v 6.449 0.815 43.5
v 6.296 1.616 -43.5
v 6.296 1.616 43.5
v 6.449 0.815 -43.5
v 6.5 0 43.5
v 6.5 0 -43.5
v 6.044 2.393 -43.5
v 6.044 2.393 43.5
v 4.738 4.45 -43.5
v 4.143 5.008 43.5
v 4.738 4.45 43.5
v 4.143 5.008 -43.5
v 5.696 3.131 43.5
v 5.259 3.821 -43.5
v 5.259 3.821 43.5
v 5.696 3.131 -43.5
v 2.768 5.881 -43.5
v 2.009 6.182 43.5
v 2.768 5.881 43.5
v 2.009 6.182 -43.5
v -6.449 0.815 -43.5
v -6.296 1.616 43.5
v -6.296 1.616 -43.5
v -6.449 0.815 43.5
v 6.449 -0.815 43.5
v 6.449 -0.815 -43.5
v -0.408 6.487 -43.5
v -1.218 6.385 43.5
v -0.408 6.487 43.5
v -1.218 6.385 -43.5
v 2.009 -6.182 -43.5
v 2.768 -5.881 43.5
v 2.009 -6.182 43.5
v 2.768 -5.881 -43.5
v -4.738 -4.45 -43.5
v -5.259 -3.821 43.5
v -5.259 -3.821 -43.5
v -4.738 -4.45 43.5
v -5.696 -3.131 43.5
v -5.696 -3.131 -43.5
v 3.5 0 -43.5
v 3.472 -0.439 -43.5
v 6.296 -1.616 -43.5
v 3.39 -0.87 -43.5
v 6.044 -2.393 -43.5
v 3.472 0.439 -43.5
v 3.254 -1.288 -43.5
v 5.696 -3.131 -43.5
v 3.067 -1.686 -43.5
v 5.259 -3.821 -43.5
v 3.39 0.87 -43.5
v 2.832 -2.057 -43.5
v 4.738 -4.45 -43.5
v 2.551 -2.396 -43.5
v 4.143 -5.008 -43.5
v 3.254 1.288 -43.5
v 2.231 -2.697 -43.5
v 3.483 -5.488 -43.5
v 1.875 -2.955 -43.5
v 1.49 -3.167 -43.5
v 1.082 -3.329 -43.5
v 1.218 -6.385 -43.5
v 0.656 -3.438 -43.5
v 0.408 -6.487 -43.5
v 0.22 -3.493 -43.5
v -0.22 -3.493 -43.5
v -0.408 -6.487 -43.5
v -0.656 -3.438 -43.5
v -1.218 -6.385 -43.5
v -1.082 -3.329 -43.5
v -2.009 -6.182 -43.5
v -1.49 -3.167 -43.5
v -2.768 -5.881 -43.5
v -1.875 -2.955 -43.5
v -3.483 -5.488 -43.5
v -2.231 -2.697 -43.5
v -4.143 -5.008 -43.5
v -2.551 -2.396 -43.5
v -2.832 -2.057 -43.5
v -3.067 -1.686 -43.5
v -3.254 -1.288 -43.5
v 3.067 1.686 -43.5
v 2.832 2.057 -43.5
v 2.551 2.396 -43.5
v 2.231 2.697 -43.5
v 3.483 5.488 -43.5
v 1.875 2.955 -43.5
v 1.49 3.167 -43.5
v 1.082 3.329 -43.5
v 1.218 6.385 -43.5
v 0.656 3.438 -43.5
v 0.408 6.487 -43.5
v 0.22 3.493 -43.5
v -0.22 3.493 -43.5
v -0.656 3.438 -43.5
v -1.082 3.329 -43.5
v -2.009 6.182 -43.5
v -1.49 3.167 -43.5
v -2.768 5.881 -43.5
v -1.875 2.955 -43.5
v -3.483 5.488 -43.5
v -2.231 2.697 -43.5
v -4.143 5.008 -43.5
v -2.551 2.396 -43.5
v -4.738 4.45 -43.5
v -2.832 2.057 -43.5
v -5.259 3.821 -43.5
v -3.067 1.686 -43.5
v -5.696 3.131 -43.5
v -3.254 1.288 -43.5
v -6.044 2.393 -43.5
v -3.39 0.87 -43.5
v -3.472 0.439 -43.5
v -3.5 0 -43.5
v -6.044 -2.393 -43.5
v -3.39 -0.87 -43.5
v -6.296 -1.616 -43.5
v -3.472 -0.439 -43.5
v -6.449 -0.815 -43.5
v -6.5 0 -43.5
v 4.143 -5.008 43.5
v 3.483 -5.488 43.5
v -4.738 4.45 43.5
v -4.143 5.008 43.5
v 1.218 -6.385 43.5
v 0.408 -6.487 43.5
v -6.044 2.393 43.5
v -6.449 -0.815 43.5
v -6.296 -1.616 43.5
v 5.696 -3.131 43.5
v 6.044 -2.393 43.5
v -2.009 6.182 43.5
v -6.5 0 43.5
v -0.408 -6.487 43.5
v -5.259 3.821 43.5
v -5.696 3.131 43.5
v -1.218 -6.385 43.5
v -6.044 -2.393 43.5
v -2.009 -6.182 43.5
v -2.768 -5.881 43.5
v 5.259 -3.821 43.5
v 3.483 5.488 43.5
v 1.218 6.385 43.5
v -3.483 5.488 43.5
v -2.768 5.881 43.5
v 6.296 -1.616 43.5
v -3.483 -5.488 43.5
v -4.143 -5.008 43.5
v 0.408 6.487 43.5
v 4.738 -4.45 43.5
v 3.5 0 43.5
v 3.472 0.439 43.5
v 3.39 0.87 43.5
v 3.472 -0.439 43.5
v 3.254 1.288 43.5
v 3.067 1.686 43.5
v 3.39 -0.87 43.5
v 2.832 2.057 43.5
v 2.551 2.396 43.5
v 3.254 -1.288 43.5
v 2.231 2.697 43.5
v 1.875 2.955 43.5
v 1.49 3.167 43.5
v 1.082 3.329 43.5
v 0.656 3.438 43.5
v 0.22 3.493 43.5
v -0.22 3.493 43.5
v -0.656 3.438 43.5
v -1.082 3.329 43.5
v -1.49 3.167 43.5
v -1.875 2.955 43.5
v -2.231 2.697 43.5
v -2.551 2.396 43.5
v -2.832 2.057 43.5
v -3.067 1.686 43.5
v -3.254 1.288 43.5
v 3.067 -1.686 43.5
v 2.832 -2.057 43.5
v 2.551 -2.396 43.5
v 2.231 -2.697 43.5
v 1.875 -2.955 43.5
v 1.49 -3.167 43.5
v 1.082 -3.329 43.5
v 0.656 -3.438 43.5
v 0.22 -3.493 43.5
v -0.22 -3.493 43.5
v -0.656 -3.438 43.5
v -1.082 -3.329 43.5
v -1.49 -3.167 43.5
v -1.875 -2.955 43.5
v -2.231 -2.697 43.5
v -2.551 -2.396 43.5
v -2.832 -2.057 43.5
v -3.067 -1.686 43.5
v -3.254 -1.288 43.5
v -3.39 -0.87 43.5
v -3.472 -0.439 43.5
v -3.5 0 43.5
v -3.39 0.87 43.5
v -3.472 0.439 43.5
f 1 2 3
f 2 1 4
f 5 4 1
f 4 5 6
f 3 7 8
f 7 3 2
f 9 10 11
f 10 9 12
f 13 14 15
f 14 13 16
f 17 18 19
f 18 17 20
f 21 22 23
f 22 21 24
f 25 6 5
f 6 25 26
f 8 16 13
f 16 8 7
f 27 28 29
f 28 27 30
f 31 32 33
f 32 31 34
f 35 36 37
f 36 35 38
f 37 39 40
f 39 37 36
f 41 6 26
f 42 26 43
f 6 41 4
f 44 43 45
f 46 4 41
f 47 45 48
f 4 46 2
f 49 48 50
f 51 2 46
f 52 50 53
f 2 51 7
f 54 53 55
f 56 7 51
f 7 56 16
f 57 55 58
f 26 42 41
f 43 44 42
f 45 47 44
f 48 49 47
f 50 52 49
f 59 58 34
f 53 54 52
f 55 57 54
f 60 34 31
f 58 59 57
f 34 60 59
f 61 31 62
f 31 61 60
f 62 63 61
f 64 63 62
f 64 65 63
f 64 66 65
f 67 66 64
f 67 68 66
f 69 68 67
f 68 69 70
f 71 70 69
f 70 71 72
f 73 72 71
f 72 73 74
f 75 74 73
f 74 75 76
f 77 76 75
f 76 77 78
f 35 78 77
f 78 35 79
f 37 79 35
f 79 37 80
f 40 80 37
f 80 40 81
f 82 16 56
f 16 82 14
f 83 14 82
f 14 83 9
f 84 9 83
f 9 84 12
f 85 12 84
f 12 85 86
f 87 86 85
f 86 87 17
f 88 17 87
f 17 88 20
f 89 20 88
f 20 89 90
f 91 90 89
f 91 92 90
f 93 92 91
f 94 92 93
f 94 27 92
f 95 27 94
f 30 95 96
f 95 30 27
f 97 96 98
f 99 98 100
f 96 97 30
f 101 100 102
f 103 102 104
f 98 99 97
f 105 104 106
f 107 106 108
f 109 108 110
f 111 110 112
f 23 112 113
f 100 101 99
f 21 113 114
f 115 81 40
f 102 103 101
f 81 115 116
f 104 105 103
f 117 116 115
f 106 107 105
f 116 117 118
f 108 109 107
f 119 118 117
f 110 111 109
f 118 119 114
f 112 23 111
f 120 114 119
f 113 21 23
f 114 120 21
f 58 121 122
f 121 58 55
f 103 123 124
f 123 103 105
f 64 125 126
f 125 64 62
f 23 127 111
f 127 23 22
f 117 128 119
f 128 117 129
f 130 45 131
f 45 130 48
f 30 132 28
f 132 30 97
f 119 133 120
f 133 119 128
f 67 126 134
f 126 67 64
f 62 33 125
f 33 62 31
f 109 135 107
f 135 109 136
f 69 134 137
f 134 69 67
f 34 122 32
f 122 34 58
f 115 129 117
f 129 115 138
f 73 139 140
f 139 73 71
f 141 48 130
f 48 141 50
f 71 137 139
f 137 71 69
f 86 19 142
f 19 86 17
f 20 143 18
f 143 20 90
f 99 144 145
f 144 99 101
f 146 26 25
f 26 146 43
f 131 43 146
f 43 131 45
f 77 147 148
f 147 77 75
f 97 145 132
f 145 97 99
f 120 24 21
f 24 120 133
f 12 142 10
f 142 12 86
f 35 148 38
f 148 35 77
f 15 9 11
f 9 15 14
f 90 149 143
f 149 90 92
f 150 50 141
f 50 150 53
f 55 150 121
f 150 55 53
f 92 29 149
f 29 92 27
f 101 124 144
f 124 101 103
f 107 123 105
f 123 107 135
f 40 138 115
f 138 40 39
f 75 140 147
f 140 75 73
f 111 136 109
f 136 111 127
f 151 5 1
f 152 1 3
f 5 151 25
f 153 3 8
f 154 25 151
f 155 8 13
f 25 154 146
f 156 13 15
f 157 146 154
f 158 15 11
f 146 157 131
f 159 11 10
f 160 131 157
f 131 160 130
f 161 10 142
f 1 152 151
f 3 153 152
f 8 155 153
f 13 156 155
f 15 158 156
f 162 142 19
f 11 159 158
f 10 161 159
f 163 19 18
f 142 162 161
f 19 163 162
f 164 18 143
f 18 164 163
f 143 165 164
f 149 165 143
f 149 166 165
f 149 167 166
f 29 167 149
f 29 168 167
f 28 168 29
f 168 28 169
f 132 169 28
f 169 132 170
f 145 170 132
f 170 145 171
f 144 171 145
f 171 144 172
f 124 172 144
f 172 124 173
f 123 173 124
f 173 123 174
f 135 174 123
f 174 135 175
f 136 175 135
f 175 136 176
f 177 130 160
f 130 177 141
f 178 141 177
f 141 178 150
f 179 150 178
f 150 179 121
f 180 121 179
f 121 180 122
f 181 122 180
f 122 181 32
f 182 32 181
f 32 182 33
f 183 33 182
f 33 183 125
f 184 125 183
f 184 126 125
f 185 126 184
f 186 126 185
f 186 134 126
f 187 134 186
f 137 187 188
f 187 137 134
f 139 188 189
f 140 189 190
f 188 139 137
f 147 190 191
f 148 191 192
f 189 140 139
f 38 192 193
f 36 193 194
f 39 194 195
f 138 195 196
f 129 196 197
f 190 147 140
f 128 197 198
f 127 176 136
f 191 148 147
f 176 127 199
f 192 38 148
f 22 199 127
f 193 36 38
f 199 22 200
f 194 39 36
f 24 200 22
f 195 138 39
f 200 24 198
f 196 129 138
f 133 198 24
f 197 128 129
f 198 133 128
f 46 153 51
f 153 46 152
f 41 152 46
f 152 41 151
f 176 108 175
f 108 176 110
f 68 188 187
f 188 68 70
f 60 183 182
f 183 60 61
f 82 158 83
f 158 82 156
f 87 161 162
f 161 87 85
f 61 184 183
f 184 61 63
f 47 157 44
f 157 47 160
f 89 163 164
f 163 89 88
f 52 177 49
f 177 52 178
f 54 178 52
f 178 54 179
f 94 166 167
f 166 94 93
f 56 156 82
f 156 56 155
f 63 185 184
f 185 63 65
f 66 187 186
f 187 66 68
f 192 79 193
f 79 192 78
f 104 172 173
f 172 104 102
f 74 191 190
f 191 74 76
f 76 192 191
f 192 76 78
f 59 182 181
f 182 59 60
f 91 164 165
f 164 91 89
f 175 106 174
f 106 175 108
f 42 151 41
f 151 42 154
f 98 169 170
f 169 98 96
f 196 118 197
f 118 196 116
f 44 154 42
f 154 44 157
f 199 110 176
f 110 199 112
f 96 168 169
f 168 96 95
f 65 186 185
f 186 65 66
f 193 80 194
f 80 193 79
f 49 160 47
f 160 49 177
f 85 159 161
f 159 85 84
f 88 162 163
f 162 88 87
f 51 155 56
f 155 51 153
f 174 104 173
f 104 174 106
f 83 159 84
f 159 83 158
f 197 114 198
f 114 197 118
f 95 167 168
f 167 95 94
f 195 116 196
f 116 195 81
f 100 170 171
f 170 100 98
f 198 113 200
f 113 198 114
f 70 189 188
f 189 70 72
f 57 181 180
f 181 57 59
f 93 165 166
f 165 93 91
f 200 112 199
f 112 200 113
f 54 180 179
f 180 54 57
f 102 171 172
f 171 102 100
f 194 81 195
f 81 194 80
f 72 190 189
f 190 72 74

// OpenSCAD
$fn = 50;


difference() {
	union() {
		translate(v = [0, 0, -43.5000000000]) {
			cylinder(h = 87, r = 6.5000000000);
		}
	}
	union() {
		translate(v = [0, 0, -100.0000000000]) {
			cylinder(h = 200, r = 3.5000000000);
		}
	}
}
